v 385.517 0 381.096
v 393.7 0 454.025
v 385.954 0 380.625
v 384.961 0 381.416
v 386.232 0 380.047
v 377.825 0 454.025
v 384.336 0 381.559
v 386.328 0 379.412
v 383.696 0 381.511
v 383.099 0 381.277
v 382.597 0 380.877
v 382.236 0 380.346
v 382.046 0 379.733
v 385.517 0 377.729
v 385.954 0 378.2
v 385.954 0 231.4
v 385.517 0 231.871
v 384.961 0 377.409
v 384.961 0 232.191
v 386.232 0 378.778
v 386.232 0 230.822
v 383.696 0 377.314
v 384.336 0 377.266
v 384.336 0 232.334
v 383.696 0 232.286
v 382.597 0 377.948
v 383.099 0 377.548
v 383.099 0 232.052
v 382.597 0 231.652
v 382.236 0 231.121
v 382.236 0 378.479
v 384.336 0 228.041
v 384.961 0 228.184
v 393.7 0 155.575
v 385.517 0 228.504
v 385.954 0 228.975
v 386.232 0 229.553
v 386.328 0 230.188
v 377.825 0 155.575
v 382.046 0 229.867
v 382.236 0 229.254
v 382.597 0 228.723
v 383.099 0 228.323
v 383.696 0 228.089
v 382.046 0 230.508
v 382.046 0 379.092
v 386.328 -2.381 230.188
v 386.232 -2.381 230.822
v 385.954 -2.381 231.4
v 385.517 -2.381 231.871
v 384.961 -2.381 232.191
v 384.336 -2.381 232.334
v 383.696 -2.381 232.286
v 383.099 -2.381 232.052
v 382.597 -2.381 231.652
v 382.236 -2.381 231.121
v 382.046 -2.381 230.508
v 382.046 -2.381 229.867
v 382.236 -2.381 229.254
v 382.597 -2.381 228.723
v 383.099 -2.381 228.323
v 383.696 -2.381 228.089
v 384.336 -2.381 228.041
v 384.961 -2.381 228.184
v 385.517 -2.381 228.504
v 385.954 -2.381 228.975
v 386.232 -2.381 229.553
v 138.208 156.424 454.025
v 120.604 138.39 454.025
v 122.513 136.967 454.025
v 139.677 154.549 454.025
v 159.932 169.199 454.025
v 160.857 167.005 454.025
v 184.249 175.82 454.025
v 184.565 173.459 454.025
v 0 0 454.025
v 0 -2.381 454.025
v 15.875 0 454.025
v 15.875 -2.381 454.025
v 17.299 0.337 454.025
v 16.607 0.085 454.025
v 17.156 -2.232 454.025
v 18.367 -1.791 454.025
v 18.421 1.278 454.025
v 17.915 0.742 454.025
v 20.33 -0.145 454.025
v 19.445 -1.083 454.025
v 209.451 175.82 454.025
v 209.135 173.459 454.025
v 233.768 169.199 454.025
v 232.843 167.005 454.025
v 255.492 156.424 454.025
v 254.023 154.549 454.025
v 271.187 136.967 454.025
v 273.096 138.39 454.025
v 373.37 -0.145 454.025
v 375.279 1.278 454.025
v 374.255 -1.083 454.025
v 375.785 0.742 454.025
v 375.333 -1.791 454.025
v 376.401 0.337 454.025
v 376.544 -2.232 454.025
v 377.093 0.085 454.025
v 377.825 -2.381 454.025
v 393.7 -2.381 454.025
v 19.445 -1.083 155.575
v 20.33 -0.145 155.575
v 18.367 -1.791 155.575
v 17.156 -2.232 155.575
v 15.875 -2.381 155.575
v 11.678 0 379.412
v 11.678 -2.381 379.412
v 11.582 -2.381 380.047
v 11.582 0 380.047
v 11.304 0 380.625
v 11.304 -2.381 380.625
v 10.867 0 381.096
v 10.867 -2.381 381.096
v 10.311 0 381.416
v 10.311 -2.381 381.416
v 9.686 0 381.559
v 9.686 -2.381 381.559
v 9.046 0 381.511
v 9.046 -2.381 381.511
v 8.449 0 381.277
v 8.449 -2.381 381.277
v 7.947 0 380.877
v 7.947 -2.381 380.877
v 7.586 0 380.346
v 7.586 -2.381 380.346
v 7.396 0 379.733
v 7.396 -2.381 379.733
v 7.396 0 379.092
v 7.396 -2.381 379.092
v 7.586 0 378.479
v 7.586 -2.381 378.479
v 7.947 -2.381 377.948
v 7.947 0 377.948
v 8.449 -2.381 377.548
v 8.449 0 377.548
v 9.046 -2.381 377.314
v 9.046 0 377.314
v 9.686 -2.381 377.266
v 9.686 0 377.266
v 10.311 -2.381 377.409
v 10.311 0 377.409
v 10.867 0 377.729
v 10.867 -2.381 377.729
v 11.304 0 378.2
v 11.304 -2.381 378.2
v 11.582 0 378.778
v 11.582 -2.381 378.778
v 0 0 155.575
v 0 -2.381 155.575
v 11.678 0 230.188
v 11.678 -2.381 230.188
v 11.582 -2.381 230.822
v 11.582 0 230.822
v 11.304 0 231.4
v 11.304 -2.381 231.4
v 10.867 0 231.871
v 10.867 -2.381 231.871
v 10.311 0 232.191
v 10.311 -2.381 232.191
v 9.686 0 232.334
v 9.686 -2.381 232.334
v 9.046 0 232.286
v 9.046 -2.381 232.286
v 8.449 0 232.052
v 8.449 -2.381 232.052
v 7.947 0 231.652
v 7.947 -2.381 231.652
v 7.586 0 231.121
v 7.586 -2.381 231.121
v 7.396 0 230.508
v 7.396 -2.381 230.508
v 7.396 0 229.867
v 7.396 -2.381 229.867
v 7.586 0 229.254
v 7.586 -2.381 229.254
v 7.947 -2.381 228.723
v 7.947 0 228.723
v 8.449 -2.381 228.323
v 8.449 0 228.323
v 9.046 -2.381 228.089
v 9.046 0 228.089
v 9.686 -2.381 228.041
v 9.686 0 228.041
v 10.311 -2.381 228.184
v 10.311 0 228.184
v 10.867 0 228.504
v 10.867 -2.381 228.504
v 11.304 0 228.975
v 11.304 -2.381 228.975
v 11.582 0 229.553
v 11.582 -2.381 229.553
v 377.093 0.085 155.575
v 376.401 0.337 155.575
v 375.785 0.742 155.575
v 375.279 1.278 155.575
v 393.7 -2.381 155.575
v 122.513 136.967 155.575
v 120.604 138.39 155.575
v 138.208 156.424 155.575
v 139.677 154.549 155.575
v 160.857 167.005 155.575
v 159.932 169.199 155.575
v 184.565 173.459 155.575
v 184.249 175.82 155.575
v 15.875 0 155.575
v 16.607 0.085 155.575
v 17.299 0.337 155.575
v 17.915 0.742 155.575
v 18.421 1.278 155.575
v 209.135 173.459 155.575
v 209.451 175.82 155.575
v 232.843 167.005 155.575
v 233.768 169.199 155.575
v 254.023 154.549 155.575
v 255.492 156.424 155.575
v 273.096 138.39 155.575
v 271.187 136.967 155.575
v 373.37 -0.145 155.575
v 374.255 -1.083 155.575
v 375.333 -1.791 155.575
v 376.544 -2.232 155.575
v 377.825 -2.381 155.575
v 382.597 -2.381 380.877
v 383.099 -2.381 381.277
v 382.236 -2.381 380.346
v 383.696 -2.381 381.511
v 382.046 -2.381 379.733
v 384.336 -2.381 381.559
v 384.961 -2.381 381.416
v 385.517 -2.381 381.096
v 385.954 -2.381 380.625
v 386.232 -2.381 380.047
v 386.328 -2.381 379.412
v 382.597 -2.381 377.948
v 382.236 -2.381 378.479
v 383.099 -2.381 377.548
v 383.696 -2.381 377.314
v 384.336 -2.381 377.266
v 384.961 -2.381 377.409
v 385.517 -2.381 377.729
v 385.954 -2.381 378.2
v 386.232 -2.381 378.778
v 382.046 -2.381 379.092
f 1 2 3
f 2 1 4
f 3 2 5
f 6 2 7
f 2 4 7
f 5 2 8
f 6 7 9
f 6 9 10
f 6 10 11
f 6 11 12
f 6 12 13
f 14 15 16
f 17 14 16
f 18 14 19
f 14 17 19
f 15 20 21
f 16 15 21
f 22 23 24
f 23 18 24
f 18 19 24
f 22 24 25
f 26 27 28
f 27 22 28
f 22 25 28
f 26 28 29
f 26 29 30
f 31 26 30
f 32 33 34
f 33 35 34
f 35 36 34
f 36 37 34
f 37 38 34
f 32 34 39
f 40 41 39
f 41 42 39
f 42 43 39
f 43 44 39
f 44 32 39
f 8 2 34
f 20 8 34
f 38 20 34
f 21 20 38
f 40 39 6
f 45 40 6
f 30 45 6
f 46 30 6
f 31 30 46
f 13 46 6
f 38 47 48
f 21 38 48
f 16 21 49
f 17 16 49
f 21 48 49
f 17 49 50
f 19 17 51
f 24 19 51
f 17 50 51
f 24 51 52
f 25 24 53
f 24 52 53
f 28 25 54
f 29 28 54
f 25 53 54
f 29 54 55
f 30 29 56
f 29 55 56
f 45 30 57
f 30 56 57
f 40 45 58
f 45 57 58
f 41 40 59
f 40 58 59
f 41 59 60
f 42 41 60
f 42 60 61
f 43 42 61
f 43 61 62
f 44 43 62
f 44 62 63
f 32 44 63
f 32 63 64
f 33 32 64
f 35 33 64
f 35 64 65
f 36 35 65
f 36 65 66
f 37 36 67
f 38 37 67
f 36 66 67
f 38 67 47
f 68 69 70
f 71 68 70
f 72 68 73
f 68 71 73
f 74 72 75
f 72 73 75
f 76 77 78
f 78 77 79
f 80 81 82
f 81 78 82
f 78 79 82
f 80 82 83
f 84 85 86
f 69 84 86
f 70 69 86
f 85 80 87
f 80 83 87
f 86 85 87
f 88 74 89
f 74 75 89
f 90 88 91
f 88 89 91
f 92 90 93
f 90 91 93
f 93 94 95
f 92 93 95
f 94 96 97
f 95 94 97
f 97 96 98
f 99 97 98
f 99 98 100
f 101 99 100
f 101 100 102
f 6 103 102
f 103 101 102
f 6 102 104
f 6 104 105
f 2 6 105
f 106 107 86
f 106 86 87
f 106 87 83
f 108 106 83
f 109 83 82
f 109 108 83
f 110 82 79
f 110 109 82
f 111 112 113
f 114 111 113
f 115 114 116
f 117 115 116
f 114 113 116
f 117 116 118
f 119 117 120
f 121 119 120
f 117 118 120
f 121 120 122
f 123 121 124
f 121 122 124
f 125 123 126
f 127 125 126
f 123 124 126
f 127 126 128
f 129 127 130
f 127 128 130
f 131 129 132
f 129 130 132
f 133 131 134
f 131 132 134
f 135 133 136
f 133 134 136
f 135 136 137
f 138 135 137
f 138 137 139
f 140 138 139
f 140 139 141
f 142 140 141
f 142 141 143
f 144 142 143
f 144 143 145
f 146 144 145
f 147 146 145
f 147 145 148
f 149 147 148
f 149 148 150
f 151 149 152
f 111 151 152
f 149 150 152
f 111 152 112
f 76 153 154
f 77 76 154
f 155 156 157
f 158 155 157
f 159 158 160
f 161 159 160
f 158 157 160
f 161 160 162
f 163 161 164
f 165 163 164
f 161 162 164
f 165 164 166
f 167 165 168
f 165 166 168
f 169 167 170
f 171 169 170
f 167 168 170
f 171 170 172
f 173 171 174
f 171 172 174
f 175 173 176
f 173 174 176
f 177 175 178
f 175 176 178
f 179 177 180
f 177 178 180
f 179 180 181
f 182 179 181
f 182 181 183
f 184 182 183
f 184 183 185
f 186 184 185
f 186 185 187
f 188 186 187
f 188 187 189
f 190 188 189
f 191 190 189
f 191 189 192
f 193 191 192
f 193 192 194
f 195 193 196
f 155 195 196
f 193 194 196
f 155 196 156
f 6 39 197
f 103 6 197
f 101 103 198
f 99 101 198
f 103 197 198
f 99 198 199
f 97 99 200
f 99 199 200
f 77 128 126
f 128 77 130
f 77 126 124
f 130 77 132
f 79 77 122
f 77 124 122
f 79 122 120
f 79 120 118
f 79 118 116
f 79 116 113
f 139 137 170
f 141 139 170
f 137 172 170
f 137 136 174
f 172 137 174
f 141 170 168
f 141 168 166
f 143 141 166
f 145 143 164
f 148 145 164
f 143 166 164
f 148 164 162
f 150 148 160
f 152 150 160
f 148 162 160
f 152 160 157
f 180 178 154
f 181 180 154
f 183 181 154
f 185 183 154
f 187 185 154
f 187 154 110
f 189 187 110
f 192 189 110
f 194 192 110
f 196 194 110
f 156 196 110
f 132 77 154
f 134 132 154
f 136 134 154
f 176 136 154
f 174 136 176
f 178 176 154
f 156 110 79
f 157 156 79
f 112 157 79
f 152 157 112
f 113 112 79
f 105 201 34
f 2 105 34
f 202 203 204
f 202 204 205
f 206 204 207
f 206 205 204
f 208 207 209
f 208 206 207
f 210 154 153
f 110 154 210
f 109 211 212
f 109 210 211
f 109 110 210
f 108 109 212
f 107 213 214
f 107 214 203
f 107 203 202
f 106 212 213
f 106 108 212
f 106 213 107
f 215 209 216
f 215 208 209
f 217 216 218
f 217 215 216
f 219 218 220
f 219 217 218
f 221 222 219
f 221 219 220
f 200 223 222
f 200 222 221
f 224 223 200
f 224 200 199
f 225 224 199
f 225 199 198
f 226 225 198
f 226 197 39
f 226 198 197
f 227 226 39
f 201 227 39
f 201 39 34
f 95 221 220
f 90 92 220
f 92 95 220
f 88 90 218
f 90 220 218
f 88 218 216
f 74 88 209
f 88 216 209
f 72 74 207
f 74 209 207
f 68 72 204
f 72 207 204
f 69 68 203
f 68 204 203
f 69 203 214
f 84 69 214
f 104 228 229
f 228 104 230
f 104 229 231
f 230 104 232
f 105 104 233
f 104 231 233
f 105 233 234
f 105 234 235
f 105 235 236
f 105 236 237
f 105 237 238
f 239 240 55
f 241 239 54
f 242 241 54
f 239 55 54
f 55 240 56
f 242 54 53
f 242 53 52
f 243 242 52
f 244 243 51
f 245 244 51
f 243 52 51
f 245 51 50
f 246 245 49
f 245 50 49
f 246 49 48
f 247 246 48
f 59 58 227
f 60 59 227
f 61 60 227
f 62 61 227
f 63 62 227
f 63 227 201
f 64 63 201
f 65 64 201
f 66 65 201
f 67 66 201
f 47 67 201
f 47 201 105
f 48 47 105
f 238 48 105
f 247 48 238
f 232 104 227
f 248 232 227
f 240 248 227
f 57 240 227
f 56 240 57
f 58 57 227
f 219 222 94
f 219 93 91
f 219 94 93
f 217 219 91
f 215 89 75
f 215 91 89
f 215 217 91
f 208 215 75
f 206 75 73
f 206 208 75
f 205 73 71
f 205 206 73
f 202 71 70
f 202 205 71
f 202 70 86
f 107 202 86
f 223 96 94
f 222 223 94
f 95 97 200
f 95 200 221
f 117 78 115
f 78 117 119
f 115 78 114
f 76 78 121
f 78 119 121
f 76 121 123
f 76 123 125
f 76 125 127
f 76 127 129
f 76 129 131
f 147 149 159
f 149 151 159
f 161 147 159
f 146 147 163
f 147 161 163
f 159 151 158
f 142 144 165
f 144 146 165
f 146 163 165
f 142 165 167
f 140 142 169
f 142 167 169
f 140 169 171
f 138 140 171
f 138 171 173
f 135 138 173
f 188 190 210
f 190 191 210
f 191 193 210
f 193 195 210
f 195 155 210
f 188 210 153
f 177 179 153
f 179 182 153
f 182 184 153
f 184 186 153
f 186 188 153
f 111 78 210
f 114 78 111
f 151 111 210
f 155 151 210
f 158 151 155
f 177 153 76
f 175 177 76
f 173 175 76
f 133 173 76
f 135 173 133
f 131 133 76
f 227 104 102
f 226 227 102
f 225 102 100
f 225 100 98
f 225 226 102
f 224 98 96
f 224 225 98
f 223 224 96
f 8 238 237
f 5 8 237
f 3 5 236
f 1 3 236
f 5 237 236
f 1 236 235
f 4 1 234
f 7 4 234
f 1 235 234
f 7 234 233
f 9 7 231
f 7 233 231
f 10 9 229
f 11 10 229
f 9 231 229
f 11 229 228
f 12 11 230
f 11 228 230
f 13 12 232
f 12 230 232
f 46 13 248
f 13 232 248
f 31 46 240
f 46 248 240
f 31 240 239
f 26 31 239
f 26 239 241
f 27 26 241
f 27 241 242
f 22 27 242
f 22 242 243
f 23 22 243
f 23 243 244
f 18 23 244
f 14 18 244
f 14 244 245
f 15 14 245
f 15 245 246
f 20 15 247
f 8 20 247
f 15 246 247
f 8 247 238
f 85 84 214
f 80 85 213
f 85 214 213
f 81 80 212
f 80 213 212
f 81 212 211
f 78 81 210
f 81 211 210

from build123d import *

# Parameters (mm, degrees)
F1_DEPTH = 609.6
F2_T     = 2.38125
F3_W     = 393.7
F3_H     = 155.575
F4_DEPTH = 179.0405708
F5_R     = 2.15265
F6_DEPTH = 2.38125


# Not quite as in the source:
# - a shell that OpenCascade refuses in one call is made with other operations: the cavity is built on its own and cut out


with BuildPart() as f1:
    # F0 (on Top) → F1 (new body)
    with BuildSketch(Plane.XY):
        with BuildLine():
            Line((15.875, 0), (0, 0))
            Line((0, 0), (0, -2.38125))
            Line((0, -2.38125), (393.7, -2.38125))
            Line((393.7, -2.38125), (393.7, 0))
            Line((393.7, 0), (377.825, 0))
            ThreePointArc((377.825, 0), (376.4007720387, 0.337360186), (375.2792072647, 1.2777482116))
            Line((375.2792072647, 1.2777482116), (273.096492423, 138.389761864))
            ThreePointArc((273.096492423, 138.389761864), (196.85, 176.6583208), (120.603507577, 138.389761864))
            Line((120.603507577, 138.389761864), (18.4207927353, 1.2777482116))
            ThreePointArc((18.4207927353, 1.2777482116), (17.2992279613, 0.337360186), (15.875, 0))
        make_face()
    extrude(amount=F1_DEPTH)

    # F2: shell of thickness 2.38125, made by hand


with BuildPart() as f2_core1:
    # F2_t2: copy of F1
    add(f1.part)

    # the walls: a layer under each face that stays
    f2_faces = [f2_core1.faces().sort_by_distance(p)[0] for p in [
        (196.85, 176.6583208, 304.8),
        (69.5121501562, 69.8337550378, 304.8),
        (17.2992279613, 0.337360186, 304.8),
        (7.9375, 0, 304.8),
        (0, -1.190625, 304.8),
        (393.7, -1.190625, 304.8),
        (385.7625, 0, 304.8),
        (376.4007720387, 0.337360186, 304.8),
        (324.1878498438, 69.8337550378, 304.8),
        (196.85, 87.1385354, 0),
        (196.85, 87.1385354, 609.6),
    ]]
    thicken(f2_faces, amount=-F2_T, mode=Mode.SUBTRACT)


with BuildPart() as f1_1:
    add(f1.part)

    # what is left inside the walls is the cavity
    f2_cavity = [f2_core1.part.solids().sort_by_distance(p)[0] for p in [
        (196.85, -2.357438, 405.60625),
    ]]
    add(f2_cavity, mode=Mode.SUBTRACT)

    # F3 (on face) → F4 (cut, through all)
    with BuildSketch(Plane.XZ.offset(2.38125)):
        with Locations((196.85, 531.8125)):
            Rectangle(F3_W, F3_H)
        with Locations((196.85, 77.7875)):
            Rectangle(F3_W, F3_H)
    extrude(amount=-F4_DEPTH, mode=Mode.SUBTRACT)

    # F5 (on face) → F6 (cut, through all)
    with BuildSketch(Plane.XZ.offset(2.38125)):
        with Locations((384.175, 230.1875)):
            Circle(F5_R)
        with Locations((384.175, 379.4125)):
            Circle(F5_R)
        with Locations((9.525, 379.4125)):
            Circle(F5_R)
        with Locations((9.525, 230.1875)):
            Circle(F5_R)
    extrude(amount=-F6_DEPTH, mode=Mode.SUBTRACT)


solid = f1_1.part
